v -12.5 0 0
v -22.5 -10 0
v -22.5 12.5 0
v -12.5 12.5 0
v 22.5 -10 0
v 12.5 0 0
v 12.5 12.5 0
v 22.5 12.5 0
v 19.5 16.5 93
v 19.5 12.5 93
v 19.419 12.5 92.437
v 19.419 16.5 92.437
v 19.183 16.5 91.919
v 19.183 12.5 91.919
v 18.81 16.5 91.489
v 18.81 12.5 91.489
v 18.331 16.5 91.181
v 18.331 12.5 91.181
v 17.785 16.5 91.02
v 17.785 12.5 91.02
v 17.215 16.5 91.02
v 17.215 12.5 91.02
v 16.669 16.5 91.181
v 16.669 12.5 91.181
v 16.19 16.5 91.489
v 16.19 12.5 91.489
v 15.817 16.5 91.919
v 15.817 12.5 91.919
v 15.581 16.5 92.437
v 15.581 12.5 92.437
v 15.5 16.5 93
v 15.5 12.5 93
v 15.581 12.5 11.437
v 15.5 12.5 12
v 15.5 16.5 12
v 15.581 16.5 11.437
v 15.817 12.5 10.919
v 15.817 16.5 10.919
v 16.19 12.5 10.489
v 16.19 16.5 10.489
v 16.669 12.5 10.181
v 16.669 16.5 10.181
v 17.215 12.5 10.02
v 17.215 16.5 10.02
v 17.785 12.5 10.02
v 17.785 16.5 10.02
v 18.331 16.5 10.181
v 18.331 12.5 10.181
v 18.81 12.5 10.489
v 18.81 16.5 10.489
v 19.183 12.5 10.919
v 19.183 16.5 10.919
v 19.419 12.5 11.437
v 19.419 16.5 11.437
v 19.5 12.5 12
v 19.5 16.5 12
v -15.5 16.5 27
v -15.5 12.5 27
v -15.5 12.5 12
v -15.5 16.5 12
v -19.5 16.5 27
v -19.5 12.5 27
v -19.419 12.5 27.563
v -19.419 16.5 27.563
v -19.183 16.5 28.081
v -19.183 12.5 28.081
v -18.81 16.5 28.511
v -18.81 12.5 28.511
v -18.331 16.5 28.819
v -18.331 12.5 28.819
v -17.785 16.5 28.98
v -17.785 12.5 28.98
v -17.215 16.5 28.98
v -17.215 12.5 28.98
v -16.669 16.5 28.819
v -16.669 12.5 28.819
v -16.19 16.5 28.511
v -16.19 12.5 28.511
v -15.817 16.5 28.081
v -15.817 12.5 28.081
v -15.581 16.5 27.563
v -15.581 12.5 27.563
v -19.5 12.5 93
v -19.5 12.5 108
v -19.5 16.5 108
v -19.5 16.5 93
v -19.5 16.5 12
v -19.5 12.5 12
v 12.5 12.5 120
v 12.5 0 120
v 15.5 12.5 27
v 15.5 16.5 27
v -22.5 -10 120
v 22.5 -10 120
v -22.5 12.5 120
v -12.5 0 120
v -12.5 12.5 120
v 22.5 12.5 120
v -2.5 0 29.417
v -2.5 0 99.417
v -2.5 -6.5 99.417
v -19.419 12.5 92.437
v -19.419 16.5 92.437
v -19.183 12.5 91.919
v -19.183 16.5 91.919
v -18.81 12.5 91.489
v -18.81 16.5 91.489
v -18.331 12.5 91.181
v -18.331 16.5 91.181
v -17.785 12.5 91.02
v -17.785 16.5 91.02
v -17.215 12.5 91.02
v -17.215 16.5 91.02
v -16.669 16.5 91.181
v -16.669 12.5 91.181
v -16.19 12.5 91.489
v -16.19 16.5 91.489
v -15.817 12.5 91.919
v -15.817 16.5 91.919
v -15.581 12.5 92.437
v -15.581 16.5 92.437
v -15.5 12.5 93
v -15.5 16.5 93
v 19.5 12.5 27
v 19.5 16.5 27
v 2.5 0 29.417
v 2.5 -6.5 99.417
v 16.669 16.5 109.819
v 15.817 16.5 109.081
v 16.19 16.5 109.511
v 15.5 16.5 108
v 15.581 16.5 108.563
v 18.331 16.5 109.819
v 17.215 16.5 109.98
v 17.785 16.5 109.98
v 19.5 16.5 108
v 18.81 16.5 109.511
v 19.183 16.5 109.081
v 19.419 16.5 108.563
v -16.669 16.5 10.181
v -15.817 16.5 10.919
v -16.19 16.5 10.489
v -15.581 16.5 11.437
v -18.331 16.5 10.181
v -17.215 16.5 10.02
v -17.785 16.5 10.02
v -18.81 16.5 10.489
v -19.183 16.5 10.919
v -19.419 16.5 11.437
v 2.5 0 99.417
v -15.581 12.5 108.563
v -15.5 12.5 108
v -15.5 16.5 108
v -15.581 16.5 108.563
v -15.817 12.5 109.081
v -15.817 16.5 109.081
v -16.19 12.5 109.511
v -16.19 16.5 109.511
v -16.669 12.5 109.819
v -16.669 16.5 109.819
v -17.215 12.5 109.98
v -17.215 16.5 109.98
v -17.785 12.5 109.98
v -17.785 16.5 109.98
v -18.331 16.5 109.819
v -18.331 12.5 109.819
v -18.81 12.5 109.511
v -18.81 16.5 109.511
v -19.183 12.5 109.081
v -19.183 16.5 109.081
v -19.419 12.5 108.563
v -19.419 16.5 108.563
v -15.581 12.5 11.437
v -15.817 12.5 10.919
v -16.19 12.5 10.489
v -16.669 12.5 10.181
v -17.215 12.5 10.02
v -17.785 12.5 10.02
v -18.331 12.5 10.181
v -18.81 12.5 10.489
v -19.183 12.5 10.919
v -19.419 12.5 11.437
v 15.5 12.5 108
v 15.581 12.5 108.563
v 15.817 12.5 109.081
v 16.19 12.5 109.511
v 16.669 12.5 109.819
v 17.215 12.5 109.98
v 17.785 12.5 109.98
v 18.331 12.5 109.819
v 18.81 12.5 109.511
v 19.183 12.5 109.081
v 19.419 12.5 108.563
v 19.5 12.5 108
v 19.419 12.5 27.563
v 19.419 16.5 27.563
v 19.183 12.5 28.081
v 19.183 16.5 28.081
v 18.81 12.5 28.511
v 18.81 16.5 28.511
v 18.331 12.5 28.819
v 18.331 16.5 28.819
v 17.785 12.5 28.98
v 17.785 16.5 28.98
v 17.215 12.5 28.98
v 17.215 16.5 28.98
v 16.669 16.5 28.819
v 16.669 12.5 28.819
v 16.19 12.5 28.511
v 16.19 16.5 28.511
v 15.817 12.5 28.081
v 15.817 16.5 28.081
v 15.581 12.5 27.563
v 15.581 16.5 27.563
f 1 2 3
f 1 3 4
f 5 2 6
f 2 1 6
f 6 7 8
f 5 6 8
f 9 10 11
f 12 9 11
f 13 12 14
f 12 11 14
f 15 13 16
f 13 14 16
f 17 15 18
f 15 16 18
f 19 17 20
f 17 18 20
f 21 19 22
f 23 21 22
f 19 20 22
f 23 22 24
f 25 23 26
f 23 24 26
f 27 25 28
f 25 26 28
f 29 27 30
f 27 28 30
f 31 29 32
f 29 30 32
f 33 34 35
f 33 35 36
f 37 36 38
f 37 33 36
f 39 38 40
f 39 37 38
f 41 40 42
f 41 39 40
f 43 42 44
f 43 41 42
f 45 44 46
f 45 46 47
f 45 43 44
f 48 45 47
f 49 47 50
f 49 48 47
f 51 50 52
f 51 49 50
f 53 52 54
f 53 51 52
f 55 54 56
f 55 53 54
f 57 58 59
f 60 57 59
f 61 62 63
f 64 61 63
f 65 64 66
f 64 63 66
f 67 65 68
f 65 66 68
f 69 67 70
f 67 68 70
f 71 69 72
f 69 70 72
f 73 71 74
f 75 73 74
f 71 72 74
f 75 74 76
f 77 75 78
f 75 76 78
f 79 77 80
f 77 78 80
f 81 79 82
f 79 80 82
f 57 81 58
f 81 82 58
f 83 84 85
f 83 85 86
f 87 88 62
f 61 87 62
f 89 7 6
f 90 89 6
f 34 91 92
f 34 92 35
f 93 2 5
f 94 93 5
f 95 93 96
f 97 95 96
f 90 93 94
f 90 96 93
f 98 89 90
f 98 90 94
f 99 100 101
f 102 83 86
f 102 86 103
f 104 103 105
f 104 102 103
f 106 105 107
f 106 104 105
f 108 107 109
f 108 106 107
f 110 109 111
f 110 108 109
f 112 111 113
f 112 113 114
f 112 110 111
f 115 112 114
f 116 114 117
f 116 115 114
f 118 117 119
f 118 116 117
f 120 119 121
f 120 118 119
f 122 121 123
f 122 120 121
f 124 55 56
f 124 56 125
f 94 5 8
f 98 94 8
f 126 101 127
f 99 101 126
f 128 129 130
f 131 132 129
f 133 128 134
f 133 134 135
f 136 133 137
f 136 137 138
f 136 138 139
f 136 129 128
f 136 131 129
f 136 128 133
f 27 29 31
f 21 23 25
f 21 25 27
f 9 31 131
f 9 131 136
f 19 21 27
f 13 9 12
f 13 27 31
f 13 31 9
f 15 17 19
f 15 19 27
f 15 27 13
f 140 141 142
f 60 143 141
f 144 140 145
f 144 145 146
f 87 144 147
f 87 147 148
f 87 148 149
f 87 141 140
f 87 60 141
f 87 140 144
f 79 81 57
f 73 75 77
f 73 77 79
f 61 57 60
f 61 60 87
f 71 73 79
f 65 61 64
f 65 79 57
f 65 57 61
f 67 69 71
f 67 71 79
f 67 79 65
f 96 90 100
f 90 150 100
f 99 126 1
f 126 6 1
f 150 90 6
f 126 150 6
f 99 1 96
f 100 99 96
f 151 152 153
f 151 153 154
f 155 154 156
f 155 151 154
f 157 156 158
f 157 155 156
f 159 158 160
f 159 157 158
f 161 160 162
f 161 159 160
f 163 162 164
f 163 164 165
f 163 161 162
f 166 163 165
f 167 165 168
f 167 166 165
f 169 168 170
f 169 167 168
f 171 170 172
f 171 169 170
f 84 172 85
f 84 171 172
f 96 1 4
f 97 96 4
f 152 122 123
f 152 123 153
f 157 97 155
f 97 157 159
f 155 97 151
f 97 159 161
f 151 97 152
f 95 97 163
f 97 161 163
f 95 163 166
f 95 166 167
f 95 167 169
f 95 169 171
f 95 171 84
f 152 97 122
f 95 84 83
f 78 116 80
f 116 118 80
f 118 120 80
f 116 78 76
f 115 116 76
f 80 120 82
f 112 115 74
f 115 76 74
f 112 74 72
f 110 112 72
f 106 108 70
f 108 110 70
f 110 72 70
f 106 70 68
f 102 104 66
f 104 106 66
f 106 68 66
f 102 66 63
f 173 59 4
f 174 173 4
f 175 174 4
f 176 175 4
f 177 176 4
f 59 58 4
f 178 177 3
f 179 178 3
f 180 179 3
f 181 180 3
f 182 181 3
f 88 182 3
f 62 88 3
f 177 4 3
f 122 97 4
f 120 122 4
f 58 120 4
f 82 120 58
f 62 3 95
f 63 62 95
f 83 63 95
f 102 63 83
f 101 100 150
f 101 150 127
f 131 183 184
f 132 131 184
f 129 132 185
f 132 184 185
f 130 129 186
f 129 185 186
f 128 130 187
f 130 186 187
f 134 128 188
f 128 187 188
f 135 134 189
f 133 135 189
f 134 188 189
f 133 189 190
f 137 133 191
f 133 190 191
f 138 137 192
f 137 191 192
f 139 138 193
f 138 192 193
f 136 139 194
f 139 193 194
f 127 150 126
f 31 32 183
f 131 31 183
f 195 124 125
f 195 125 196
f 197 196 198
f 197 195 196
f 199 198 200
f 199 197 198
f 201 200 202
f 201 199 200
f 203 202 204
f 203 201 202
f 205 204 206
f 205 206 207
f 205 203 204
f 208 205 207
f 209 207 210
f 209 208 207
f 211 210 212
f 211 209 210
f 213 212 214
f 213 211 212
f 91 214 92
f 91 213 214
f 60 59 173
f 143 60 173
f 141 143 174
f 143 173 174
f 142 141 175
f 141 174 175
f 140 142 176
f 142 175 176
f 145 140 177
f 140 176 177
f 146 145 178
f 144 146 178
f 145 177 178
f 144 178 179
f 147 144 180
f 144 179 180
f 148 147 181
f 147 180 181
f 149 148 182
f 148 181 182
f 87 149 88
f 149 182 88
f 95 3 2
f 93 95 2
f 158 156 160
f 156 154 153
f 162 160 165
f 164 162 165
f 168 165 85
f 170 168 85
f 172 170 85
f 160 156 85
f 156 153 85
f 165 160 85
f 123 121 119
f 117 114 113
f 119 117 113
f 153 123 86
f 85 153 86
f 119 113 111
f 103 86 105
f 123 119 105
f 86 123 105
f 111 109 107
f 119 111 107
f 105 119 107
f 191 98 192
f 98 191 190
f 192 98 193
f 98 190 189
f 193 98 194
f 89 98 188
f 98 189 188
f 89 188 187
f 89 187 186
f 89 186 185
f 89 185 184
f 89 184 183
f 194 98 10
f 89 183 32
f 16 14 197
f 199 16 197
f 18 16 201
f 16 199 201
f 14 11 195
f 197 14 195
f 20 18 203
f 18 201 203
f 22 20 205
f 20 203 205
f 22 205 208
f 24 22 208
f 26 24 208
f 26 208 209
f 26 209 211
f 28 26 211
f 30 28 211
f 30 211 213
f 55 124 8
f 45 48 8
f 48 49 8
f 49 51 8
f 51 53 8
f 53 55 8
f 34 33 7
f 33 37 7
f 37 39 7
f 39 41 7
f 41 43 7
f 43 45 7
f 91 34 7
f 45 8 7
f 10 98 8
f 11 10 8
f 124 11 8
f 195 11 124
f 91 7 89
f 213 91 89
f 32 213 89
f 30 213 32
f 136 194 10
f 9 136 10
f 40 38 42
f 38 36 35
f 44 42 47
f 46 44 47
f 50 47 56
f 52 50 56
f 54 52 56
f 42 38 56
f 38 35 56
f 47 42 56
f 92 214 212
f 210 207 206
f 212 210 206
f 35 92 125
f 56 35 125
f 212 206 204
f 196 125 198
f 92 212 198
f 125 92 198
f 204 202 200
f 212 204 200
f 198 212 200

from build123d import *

# Parameters (mm, degrees)
BOSS_EXTRUDE1_DEPTH     = 120
CUT_EXTRUDE1_DEPTH      = 2.5
CUT_EXTRUDE1_DEPTH_BACK = 2.5
BOSS_EXTRUDE2_DEPTH     = 4
MIRROR2_COPY_1_DEPTH    = 4


with BuildPart() as part:
    # Sketch1 → Boss-Extrude1 (new body)
    with BuildSketch(Plane.XY):
        Polygon((-12.5, 12.5), (-22.5, 12.5), (-22.5, -10), (22.5, -10), (22.5, 12.5), (12.5, 12.5), (12.5, 0), (-12.5, 0), align=None)
    extrude(amount=BOSS_EXTRUDE1_DEPTH)

    # Sketch2 → Cut-Extrude1 (cut, two sides: drawn at the far end of the back side and taken through both)
    with BuildSketch(Plane(origin=(0, 0, 0), x_dir=(0, 0, -1), z_dir=(1, 0, 0)).offset(-CUT_EXTRUDE1_DEPTH_BACK)):
        Polygon((-29.416511254, 0), (-99.416511254, 0), (-99.416511254, -6.5), align=None)
    extrude(amount=CUT_EXTRUDE1_DEPTH + CUT_EXTRUDE1_DEPTH_BACK, mode=Mode.SUBTRACT)

    # Sketch3 → Boss-Extrude2 (add)
    with BuildSketch(Plane(origin=(0, 12.5, 0), x_dir=(1, 0, 0), z_dir=(0, 1, 0))):
        with BuildLine():
            Line((-19.5, -108), (-19.5, -93))
            ThreePointArc((-19.5, -93), (-17.5, -91), (-15.5, -93))
            Line((-15.5, -93), (-15.5, -108))
            ThreePointArc((-15.5, -108), (-17.5, -110), (-19.5, -108))
        make_face()
    boss_extrude2 = extrude(amount=BOSS_EXTRUDE2_DEPTH)

    # Mirror1: Boss-Extrude2 across plane
    add(boss_extrude2.mirror(Plane(origin=(0, 0, 0), x_dir=(0, 0, 1), z_dir=(1, 0, 0))))

    # Mirror2: Boss-Extrude2 across plane
    add(boss_extrude2.mirror(Plane(origin=(0, 0, 60), x_dir=(1, 0, 0), z_dir=(0, 0, -1))))

    # Mirror2 copy 1 sketch → Mirror2 copy 1 (add)
    with BuildSketch(Plane(origin=(0, 12.5, 120), x_dir=(-1, 0, 0), z_dir=(0, 1, 0))):
        with BuildLine():
            Line((-19.5, -108), (-19.5, -93))
            ThreePointArc((-19.5, -93), (-17.5, -91), (-15.5, -93))
            Line((-15.5, -93), (-15.5, -108))
            ThreePointArc((-15.5, -108), (-17.5, -110), (-19.5, -108))
        make_face()
    extrude(amount=MIRROR2_COPY_1_DEPTH)


solid = part.part
